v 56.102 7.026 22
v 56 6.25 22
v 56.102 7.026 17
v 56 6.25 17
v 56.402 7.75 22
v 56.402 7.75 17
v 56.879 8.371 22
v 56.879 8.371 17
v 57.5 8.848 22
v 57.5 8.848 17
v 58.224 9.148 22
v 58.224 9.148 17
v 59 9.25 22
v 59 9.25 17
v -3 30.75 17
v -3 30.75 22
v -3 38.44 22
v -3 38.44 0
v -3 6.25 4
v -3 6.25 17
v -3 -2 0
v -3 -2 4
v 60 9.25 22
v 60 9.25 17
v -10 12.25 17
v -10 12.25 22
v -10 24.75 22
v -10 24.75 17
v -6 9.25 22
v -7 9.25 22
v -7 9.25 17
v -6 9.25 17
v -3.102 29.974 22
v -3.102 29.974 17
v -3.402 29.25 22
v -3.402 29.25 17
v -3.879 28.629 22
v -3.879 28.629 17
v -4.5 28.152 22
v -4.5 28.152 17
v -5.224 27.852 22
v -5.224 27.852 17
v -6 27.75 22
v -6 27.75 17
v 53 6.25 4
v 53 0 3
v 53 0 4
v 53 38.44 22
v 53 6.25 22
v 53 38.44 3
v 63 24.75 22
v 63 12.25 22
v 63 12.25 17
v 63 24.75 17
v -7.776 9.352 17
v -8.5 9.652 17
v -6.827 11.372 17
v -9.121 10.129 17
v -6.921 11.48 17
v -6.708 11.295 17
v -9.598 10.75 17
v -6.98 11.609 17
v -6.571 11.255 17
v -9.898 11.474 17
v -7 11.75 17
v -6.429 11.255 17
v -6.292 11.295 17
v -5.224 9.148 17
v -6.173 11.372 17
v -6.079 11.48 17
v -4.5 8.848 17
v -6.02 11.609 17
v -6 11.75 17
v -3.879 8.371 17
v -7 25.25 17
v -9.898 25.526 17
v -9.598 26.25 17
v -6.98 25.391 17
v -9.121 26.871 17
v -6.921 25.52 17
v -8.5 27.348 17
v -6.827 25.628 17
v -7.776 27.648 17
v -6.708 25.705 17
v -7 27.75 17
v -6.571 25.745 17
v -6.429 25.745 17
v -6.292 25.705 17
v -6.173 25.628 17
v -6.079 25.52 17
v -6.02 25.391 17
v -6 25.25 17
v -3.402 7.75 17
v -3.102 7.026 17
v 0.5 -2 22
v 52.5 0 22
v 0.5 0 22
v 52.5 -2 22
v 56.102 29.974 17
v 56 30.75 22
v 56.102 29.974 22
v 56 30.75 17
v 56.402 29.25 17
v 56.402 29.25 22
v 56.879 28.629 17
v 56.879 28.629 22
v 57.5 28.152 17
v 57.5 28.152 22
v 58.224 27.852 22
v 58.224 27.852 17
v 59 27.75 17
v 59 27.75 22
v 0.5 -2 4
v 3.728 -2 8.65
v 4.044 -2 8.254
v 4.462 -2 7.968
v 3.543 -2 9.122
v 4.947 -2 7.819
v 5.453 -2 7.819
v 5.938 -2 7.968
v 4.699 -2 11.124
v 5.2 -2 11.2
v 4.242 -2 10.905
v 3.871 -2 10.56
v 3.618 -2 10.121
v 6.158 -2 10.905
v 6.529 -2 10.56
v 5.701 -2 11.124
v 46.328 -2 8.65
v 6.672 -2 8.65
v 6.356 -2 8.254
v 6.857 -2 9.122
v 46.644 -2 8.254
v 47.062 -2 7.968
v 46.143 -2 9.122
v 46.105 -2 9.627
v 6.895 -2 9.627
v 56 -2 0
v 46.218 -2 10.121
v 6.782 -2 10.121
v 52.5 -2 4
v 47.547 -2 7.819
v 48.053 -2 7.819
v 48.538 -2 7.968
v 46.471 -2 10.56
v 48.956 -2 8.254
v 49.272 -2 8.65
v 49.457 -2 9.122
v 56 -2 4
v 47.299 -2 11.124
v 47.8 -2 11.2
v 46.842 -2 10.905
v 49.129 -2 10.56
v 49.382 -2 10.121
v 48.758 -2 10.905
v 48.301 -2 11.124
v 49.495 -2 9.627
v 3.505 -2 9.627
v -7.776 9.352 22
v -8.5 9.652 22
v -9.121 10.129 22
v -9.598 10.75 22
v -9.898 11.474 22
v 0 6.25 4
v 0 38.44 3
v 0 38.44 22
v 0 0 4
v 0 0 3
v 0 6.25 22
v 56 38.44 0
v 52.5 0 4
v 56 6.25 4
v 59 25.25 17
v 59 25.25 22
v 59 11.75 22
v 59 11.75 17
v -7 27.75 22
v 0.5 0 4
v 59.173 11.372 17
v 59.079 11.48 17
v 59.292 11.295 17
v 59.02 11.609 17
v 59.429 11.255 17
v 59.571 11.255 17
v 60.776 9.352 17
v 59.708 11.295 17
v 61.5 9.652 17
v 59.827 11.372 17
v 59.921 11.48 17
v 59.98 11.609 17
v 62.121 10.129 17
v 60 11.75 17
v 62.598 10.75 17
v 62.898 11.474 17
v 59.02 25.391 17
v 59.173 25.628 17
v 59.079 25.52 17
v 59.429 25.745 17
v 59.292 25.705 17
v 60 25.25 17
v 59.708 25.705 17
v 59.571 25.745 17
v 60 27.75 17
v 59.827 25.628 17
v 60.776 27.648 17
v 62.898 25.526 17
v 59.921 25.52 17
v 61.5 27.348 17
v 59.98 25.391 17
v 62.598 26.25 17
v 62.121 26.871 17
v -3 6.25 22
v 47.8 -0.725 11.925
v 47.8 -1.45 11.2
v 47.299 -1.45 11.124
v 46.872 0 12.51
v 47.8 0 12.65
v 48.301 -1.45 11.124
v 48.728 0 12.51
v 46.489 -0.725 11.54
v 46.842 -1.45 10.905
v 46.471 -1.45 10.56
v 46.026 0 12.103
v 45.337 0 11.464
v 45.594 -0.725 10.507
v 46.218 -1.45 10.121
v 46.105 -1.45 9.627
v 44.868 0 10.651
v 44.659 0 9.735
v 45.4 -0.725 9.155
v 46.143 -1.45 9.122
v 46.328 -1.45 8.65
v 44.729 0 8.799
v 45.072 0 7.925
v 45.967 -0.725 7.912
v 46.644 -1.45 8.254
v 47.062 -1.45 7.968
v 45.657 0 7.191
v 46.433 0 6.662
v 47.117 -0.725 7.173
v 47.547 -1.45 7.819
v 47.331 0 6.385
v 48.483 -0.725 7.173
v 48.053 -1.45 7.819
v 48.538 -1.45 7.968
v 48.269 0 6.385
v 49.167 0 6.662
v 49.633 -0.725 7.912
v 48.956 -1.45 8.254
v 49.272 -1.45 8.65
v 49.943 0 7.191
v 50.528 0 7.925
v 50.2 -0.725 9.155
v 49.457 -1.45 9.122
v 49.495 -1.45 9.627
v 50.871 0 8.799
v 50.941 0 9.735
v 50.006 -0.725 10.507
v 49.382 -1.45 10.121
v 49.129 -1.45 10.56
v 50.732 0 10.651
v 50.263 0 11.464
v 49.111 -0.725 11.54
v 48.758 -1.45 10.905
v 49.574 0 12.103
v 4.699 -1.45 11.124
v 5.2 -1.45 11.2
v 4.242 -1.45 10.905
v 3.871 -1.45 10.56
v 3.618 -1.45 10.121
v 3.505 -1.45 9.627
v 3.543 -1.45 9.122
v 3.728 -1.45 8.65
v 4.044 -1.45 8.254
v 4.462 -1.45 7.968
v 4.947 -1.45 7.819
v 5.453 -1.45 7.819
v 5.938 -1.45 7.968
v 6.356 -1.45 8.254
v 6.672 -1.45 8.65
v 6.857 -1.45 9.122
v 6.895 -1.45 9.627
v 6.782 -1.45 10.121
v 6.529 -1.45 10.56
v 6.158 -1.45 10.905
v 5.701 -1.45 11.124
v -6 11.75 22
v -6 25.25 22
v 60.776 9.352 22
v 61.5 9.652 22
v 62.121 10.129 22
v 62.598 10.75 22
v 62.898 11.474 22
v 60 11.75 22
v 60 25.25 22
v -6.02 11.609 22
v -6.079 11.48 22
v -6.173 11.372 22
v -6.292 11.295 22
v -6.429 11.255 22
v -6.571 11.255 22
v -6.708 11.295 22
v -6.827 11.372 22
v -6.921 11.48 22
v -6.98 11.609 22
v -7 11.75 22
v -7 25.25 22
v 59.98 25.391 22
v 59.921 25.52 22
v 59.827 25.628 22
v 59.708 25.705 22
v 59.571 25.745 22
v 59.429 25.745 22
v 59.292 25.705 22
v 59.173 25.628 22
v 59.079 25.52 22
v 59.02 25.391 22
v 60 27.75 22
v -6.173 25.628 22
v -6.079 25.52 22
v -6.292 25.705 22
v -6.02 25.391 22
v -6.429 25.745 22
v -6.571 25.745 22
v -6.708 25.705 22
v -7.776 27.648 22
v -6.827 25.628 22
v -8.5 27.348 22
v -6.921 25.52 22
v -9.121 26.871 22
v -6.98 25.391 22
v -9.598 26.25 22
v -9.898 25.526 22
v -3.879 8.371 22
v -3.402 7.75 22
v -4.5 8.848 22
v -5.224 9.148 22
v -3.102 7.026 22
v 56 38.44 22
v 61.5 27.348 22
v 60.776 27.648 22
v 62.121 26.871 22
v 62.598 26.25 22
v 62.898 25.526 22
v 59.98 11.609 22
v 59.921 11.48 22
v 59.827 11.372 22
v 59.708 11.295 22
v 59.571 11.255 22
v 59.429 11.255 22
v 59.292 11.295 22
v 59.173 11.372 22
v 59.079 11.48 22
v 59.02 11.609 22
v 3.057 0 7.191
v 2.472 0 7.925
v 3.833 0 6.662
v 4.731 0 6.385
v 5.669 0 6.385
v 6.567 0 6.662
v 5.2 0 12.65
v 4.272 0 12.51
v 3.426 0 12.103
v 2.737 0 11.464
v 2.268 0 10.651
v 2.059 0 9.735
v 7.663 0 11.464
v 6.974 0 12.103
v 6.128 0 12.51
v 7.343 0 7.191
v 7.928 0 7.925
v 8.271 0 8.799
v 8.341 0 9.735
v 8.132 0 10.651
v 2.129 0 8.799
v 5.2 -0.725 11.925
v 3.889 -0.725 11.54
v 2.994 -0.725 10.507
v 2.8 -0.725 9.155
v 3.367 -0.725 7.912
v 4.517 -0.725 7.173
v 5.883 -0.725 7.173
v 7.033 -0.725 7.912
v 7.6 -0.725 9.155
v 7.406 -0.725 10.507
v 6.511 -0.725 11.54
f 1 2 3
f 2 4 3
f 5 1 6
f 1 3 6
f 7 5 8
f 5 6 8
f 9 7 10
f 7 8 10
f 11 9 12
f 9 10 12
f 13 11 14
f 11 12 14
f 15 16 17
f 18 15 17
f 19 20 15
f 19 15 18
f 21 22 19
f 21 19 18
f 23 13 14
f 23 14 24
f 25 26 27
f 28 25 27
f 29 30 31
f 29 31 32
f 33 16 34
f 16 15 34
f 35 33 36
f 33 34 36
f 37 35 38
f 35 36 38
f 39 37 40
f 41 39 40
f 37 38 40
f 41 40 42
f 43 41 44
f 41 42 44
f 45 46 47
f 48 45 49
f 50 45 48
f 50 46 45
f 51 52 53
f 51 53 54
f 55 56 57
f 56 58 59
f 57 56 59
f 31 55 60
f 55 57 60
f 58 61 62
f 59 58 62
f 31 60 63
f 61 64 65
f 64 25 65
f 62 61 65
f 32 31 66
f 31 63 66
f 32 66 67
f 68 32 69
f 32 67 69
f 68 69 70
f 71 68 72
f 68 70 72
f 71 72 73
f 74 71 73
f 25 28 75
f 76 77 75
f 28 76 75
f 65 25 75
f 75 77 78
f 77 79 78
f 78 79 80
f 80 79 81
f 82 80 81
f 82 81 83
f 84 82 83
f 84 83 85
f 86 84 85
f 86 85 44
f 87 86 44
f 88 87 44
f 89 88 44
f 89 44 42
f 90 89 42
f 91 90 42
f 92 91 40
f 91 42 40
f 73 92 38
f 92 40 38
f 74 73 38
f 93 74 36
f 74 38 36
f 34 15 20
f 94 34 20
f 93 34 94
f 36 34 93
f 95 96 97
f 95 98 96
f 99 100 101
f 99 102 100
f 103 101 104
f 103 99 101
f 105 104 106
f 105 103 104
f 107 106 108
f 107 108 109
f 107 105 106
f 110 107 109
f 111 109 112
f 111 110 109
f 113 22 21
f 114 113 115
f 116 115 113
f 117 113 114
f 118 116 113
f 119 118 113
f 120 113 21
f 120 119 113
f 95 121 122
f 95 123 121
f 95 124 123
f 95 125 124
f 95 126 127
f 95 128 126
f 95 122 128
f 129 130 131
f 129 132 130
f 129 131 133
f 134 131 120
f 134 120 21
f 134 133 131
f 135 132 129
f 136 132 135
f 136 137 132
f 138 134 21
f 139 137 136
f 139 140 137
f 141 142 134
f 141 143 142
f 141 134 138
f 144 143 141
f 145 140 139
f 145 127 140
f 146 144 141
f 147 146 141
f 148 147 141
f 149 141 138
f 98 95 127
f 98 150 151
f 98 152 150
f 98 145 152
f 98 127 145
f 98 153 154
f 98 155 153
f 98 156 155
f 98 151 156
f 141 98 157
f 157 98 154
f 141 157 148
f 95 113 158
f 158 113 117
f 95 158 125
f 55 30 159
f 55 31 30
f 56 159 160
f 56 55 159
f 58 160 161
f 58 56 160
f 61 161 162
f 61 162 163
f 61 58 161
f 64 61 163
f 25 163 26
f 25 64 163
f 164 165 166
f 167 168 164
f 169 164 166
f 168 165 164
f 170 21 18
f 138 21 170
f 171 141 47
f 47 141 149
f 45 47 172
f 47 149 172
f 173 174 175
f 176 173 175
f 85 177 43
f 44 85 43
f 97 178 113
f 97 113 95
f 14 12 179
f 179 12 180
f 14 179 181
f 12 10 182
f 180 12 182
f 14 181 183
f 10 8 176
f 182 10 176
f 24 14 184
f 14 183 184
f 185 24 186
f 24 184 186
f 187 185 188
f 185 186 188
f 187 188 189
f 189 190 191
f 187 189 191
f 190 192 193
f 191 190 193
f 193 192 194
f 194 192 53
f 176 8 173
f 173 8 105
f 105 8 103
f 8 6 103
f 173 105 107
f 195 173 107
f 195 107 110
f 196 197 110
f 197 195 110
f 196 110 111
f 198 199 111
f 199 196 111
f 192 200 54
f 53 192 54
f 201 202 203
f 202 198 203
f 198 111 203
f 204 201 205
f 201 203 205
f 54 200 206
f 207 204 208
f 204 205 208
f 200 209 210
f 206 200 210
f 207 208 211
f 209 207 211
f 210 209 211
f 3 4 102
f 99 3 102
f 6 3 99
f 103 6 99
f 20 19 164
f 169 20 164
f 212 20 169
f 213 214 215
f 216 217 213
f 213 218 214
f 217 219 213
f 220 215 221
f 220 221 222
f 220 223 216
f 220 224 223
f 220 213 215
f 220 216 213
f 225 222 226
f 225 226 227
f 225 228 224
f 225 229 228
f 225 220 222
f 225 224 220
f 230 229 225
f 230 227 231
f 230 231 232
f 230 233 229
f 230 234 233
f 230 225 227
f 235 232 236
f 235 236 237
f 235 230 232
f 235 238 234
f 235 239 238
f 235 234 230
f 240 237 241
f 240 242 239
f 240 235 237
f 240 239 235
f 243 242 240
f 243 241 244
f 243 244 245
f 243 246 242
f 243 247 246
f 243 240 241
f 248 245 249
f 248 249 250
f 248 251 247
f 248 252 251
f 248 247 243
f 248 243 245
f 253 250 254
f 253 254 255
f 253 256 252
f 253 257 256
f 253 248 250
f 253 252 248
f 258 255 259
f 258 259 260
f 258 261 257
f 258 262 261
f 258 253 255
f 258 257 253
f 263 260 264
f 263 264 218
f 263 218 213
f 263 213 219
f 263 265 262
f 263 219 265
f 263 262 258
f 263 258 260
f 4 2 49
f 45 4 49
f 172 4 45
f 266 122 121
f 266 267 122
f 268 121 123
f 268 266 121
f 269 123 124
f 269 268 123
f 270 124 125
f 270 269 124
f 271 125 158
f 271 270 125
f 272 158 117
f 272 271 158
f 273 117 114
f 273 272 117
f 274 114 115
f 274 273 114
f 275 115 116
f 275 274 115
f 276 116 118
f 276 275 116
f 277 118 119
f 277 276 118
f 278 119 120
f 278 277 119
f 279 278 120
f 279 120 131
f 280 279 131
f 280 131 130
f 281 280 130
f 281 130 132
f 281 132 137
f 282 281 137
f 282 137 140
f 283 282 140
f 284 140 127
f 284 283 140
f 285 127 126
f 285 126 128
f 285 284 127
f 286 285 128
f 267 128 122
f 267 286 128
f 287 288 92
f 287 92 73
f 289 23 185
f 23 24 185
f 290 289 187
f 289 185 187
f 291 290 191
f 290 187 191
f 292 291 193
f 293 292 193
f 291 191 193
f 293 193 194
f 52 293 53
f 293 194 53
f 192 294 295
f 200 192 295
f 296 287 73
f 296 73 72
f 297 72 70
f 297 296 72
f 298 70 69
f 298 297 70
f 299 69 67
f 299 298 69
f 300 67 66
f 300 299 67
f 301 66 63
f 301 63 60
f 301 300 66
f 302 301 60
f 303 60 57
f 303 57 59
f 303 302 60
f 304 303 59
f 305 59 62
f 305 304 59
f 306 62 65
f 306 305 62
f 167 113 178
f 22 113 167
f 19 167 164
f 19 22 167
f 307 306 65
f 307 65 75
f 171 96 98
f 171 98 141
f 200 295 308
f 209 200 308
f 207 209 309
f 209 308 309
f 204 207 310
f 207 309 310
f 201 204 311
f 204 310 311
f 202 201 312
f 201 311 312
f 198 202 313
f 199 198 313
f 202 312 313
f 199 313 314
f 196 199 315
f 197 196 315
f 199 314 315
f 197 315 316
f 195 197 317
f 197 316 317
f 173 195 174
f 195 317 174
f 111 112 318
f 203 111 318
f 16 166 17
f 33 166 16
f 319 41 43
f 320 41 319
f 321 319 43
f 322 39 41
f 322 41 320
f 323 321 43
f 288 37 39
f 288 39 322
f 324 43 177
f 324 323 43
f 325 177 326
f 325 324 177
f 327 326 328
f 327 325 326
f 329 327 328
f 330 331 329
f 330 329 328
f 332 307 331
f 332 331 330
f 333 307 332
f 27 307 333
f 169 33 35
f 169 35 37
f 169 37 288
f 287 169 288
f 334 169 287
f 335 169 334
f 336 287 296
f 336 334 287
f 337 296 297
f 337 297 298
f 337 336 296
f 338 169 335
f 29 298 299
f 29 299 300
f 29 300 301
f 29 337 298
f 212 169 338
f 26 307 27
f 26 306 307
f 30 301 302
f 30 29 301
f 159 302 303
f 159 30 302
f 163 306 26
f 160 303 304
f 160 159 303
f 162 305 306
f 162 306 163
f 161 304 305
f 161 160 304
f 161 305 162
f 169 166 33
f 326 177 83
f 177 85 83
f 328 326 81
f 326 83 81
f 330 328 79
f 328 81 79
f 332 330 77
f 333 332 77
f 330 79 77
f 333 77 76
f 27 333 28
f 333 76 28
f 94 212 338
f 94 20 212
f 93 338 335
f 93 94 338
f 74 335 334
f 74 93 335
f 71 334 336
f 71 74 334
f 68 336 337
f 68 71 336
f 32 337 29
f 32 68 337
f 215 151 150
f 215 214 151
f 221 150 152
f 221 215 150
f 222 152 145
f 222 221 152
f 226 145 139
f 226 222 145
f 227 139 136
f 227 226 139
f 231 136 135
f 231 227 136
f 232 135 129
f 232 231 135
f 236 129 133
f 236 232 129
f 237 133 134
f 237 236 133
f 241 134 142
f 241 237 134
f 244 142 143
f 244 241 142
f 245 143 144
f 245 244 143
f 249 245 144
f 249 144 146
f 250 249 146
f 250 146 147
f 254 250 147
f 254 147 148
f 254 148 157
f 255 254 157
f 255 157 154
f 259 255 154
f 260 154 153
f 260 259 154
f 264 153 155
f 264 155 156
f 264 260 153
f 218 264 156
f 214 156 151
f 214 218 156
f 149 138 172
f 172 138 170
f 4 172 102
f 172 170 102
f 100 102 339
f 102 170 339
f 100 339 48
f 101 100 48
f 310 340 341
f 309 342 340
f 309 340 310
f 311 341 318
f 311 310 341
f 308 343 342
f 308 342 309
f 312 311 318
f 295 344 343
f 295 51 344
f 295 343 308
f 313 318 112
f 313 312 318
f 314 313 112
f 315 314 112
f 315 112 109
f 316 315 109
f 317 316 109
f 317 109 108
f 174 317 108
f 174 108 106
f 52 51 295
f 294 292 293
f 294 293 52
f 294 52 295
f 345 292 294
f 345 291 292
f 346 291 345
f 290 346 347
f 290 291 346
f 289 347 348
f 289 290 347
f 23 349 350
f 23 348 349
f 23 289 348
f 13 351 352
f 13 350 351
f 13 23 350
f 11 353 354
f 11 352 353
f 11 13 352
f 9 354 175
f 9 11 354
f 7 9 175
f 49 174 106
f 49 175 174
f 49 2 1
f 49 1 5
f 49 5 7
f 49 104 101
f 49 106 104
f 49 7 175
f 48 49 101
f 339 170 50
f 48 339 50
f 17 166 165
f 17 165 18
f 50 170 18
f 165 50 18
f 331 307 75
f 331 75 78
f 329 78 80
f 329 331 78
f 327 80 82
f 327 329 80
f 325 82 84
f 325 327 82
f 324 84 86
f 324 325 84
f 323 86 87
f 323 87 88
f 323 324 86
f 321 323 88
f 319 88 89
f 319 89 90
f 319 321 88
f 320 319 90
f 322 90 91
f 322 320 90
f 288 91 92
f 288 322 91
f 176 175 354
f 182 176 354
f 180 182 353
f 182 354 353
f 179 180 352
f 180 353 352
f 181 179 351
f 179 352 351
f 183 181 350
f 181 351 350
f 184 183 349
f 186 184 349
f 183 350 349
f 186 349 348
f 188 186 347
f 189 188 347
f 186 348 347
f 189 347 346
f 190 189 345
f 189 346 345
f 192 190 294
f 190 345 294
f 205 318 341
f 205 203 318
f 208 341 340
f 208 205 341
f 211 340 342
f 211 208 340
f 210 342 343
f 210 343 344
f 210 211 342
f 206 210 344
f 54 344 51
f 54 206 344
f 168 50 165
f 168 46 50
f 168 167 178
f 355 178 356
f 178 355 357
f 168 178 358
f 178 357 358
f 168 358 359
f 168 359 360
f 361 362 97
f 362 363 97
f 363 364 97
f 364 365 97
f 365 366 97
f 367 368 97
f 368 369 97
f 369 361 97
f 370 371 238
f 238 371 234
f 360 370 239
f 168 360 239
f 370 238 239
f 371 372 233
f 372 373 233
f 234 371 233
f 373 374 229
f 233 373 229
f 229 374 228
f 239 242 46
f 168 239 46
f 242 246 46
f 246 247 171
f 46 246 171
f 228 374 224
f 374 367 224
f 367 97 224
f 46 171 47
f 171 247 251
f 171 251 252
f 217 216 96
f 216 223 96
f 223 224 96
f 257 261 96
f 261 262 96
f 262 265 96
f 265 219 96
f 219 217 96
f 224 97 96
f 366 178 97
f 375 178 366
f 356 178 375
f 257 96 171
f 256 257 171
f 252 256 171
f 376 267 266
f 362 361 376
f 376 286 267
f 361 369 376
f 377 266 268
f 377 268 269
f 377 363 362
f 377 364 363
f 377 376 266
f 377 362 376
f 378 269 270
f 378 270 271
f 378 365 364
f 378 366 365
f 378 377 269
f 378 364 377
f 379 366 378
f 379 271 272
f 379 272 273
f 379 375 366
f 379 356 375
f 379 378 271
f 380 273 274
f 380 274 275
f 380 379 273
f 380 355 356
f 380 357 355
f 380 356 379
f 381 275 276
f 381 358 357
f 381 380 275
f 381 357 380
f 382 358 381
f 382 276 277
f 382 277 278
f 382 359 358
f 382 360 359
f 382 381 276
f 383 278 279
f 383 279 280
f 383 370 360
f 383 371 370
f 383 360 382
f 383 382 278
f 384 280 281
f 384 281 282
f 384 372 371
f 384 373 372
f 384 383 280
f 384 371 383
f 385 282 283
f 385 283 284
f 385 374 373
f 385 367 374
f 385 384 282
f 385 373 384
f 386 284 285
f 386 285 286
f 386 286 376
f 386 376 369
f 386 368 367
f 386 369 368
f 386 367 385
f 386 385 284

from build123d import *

# Parameters (mm, degrees)
SKETCH5_W                                      = 53
SKETCH5_H                                      = 37
BOSS_EXTRUDE3_DEPTH                            = 3
BOSS_EXTRUDE4_DEPTH                            = 19
BOSS_EXTRUDE4_DEPTH_BACK                       = 3
SKETCH6_W                                      = 3
SKETCH6_H                                      = 37
SKETCH7_W                                      = 7
SKETCH7_H                                      = 18.5
BOSS_EXTRUDE5_DEPTH                            = 5
FILLET3_R                                      = 3
SKETCH8_W                                      = 59
SKETCH8_H                                      = 22
SKETCH8_R                                      = 0.5
BOSS_EXTRUDE6_DEPTH                            = 2
CSK_FOR_M3_FLAT_HEAD_MACHINE_SCREW1_AT_2_COUNT = 2
CSK_FOR_M3_FLAT_HEAD_MACHINE_SCREW1_AT_2_PITCH = 42.6
BOSS_EXTRUDE7_DEPTH                            = 1.44
SKETCH11_W                                     = 18
SKETCH11_H                                     = 8.25
CUT_EXTRUDE1_DEPTH                             = 3.5
SKETCH12_W                                     = 18
SKETCH12_H                                     = 8.25
CUT_EXTRUDE2_DEPTH                             = 3.5


with BuildPart() as part:
    # Sketch5 → Boss-Extrude3 (new body)
    with BuildSketch(Plane.XY):
        with Locations((26.5, 18.5)):
            Rectangle(SKETCH5_W, SKETCH5_H)
    extrude(amount=BOSS_EXTRUDE3_DEPTH)

    # Sketch6 → Boss-Extrude4 (add, two sides: drawn at the far end of the back side and taken through both)
    with BuildSketch(Plane.XY.offset(3).offset(-BOSS_EXTRUDE4_DEPTH_BACK)):
        with Locations((-1.5, 18.5)):
            Rectangle(SKETCH6_W, SKETCH6_H)
        with Locations((54.5, 18.5)):
            Rectangle(SKETCH6_W, SKETCH6_H)
    extrude(amount=BOSS_EXTRUDE4_DEPTH + BOSS_EXTRUDE4_DEPTH_BACK)

    # Sketch7 → Boss-Extrude5 (add)
    # profile 1 of 2: a face of its own
    with BuildSketch(Plane.XY.offset(22)):
        with Locations((-6.5, 18.5)):
            Rectangle(SKETCH7_W, SKETCH7_H)
        with BuildLine():
            Line((-6, 25.25), (-6, 11.75))
            ThreePointArc((-6, 11.75), (-6.5, 11.25), (-7, 11.75))
            Line((-7, 11.75), (-7, 25.25))
            ThreePointArc((-7, 25.25), (-6.5, 25.75), (-6, 25.25))
        make_face(mode=Mode.SUBTRACT)
    # profile 2 of 2: a face of its own
    with BuildSketch(Plane.XY.offset(22)):
        with Locations((59.5, 18.5)):
            Rectangle(SKETCH7_W, SKETCH7_H)
        with BuildLine():
            Line((59, 25.25), (59, 11.75))
            ThreePointArc((59, 11.75), (59.5, 11.25), (60, 11.75))
            Line((60, 11.75), (60, 25.25))
            ThreePointArc((60, 25.25), (59.5, 25.75), (59, 25.25))
        make_face(mode=Mode.SUBTRACT)
    extrude(amount=-BOSS_EXTRUDE5_DEPTH)

    # Fillet3
    fillet3_edges = [part.edges().sort_by_distance(p)[0] for p in [
        (-3, 27.75, 19.5),
        (-3, 9.25, 19.5),
        (-10, 9.25, 19.5),
        (-10, 27.75, 19.5),
        (63, 9.25, 19.5),
        (56, 9.25, 19.5),
        (56, 27.75, 19.5),
        (63, 27.75, 19.5),
    ]]
    fillet(fillet3_edges, radius=FILLET3_R)

    # Sketch8 → Boss-Extrude6 (add)
    with BuildSketch(Plane.XZ):
        with Locations((26.5, 11)):
            Rectangle(SKETCH8_W, SKETCH8_H)
        with Locations((5.2, 9.5)):
            Circle(SKETCH8_R, mode=Mode.SUBTRACT)
        with Locations((47.8, 9.5)):
            Circle(SKETCH8_R, mode=Mode.SUBTRACT)
    extrude(amount=BOSS_EXTRUDE6_DEPTH)

    # Sketch9 → CSK for M3 Flat Head Machine Screw1 (revolve, cut)
    with BuildSketch(Plane(origin=(5.2, 0, 9.5), x_dir=(0, 0, 1), z_dir=(1, 0, 0))):
        Polygon((0, 0), (0, 2), (1.7, 2), (1.7, 1.45), (3.15, 0), align=None)
    csk_for_m3_flat_head_machine_screw1 = revolve(axis=Axis((5.2, 6.35, 9.5), (0, -1, 0)), mode=Mode.SUBTRACT)

    # CSK for M3 Flat Head Machine Screw1 at 2: CSK for M3 Flat Head Machine Screw1 ×2
    with Locations(*[(i * CSK_FOR_M3_FLAT_HEAD_MACHINE_SCREW1_AT_2_PITCH, 0, 0) for i in range(1, CSK_FOR_M3_FLAT_HEAD_MACHINE_SCREW1_AT_2_COUNT)]):
        add(csk_for_m3_flat_head_machine_screw1, mode=Mode.SUBTRACT)

    # Sketch10 → Boss-Extrude7 (add)
    with BuildSketch(Plane(origin=(0, 37, 0), x_dir=(1, 0, 0), z_dir=(0, 1, 0))):
        Polygon((0, -22), (-3, -22), (-3, 0), (56, 0), (56, -22), (53, -22), (53, -3), (0, -3), align=None)
    extrude(amount=BOSS_EXTRUDE7_DEPTH)

    # Sketch11 → Cut-Extrude1 (cut)
    with BuildSketch(Plane.ZY.offset(3)):
        with Locations((13, 2.125)):
            Rectangle(SKETCH11_W, SKETCH11_H)
    extrude(amount=-CUT_EXTRUDE1_DEPTH, mode=Mode.SUBTRACT)

    # Sketch12 → Cut-Extrude2 (cut)
    with BuildSketch(Plane(origin=(56, 0, 0), x_dir=(0, 0, -1), z_dir=(1, 0, 0))):
        with Locations((-13, 2.125)):
            Rectangle(SKETCH12_W, SKETCH12_H)
    extrude(amount=-CUT_EXTRUDE2_DEPTH, mode=Mode.SUBTRACT)


solid = part.part
